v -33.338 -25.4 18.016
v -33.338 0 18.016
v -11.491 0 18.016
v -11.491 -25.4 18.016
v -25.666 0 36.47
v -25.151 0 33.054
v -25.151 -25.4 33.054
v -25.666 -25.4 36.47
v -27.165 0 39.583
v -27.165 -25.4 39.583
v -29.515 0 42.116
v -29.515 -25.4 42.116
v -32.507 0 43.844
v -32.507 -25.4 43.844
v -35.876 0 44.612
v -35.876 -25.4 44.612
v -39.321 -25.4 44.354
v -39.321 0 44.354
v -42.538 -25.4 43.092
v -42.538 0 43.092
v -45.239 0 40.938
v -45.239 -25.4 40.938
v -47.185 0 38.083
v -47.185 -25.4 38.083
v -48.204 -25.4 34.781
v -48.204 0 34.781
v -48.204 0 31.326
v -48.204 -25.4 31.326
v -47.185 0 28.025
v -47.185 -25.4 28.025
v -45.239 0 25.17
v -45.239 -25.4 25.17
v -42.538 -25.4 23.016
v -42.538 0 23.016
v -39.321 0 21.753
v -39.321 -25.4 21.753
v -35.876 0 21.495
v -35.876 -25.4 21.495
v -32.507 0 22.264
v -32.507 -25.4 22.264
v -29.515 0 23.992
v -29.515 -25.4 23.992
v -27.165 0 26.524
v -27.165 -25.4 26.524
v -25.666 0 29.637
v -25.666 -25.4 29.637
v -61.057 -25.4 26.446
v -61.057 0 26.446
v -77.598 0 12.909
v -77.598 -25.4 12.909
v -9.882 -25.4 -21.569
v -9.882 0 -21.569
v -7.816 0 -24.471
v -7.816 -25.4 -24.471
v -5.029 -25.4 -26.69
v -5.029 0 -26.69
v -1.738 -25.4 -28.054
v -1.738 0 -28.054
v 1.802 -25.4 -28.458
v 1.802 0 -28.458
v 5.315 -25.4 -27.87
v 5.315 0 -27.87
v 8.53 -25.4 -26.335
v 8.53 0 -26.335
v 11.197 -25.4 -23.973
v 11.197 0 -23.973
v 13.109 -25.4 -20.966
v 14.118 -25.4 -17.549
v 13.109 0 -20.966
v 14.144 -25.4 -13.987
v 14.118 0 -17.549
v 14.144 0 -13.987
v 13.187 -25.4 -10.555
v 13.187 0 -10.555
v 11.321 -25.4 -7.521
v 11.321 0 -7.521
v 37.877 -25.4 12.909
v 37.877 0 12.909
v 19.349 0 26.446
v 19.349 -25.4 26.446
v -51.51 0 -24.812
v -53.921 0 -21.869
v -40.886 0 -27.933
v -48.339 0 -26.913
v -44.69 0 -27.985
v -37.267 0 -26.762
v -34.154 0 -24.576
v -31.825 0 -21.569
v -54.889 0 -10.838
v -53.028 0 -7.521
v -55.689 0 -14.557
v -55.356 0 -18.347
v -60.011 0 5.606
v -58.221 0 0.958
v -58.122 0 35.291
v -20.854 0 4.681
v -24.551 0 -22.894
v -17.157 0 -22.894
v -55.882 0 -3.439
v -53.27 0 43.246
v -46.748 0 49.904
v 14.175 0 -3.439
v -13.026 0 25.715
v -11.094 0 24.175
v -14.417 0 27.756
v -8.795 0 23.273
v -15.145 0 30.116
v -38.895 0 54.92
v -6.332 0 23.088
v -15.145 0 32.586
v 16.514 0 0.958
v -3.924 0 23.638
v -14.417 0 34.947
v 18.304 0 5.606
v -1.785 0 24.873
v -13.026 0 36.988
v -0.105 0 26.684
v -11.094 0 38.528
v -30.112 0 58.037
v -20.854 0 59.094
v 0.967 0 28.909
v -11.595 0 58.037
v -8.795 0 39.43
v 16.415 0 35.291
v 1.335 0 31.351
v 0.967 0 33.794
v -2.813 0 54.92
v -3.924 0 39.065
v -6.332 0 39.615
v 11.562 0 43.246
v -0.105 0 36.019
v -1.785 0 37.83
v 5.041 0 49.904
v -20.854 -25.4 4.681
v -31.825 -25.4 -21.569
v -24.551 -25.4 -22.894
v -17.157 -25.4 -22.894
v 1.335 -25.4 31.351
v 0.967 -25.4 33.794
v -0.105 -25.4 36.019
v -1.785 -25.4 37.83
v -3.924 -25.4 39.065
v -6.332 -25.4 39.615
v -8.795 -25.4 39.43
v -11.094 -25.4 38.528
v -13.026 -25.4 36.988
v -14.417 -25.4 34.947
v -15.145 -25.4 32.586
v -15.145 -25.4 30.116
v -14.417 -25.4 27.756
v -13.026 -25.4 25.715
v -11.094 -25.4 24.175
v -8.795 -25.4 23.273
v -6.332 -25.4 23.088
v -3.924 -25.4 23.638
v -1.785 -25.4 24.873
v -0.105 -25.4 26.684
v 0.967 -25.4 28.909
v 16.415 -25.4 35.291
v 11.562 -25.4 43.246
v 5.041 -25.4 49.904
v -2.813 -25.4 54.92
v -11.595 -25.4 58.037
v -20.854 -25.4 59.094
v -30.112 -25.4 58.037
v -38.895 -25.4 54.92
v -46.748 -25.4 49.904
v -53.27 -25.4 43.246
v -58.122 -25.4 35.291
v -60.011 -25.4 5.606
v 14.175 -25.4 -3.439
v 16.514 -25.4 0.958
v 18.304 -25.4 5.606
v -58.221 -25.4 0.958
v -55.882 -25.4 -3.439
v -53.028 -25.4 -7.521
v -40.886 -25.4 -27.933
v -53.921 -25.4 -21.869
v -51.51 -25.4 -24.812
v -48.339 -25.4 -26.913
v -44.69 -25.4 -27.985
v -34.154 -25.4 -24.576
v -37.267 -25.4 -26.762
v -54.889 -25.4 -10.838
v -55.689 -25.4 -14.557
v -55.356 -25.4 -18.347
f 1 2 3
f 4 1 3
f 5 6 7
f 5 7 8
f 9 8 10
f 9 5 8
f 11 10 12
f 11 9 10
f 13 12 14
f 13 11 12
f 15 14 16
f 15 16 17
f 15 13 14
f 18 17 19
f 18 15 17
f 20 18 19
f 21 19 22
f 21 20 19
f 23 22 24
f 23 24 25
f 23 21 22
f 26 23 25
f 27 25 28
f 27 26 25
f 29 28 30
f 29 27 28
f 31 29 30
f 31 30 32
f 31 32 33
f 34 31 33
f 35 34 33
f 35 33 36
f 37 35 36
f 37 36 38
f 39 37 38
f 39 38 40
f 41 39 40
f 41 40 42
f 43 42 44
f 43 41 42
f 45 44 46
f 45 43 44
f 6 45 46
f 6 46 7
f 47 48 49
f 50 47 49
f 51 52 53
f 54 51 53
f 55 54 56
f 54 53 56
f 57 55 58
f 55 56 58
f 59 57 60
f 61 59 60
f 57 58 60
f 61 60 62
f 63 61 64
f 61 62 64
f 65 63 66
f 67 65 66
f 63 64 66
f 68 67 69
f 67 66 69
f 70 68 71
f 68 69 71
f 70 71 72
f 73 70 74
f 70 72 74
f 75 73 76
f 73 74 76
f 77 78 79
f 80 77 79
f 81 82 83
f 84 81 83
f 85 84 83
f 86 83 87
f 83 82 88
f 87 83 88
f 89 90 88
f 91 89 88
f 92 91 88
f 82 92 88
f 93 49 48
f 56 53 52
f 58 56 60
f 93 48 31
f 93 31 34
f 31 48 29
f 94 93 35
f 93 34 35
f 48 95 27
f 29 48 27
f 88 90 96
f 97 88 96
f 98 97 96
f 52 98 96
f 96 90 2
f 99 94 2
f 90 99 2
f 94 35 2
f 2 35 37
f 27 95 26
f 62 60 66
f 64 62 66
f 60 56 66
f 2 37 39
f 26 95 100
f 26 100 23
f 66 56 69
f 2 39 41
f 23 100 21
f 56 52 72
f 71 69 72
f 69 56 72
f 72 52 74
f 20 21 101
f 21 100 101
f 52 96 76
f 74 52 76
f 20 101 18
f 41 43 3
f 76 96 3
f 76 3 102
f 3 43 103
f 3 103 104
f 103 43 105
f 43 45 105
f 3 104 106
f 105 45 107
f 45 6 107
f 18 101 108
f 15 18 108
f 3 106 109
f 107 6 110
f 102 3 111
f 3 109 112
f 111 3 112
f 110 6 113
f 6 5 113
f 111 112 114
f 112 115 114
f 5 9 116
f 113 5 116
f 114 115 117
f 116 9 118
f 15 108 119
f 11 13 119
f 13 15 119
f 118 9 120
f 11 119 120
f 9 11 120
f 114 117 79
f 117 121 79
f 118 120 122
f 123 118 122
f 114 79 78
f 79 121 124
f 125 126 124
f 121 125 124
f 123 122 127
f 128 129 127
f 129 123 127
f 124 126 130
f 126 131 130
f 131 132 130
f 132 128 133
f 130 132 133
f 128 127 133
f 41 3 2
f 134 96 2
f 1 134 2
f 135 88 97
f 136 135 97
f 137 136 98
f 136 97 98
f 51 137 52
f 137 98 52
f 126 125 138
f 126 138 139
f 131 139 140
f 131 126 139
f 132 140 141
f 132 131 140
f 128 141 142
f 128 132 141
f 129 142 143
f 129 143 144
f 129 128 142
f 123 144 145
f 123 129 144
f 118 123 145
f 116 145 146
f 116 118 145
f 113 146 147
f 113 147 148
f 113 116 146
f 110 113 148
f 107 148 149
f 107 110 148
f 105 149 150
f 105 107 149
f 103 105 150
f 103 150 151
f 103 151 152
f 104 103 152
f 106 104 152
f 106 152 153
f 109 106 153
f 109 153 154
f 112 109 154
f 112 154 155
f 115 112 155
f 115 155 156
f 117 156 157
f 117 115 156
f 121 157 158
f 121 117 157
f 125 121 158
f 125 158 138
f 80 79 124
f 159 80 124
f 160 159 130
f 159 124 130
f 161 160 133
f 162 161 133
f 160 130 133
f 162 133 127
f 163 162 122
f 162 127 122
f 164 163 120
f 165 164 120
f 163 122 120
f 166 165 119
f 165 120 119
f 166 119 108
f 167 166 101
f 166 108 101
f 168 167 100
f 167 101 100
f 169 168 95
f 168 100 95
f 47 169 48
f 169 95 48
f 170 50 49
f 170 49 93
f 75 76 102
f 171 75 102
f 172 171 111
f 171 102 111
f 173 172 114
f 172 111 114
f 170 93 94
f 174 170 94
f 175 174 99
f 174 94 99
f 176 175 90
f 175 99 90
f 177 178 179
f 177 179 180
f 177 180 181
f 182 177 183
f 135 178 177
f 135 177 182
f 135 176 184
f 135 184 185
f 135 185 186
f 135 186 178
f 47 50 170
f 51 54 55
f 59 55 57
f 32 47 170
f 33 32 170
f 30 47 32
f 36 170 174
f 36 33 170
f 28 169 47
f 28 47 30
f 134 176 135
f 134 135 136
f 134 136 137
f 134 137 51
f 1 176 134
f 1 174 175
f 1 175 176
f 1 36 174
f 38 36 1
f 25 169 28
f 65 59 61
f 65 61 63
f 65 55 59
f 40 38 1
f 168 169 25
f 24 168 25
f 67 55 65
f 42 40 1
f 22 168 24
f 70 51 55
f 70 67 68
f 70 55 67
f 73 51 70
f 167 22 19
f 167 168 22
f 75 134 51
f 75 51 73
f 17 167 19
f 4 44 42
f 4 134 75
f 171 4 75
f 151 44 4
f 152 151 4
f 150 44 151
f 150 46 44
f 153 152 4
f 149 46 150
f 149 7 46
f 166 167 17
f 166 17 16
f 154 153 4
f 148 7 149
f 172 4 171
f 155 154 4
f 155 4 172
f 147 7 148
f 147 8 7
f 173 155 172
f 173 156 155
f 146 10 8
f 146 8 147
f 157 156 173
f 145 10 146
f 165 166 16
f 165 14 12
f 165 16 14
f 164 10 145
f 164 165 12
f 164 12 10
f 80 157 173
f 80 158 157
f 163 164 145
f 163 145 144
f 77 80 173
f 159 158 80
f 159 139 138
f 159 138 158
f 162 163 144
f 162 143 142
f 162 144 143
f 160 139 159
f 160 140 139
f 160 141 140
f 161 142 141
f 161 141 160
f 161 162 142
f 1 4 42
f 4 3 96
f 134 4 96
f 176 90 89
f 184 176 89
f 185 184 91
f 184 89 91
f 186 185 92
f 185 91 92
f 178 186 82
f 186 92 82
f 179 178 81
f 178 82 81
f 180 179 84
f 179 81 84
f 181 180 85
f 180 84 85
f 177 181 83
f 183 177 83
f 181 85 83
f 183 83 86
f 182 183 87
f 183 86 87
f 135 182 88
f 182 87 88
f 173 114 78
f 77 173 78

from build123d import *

# Parameters (mm, degrees)
F0_R     = 11.591064
F0_R_2   = 8.286471
F1_DEPTH = 25.4


with BuildPart() as f1:
    # F0 (on Front) → F1 (new body)
    with BuildSketch(Plane.XZ):
        with BuildLine():
            ThreePointArc((18.303812, 5.605529), (19.740788, 11.737184), (20.223563, 18.016437))
            ThreePointArc((20.223563, 18.016437), (20.00443, 22.253734), (19.349371, 26.445823))
            ThreePointArc((19.349371, 26.445823), (-20.85367, 59.09367), (-61.056712, 26.445823))
            ThreePointArc((-61.056712, 26.445823), (-61.879304, 15.958178), (-60.011153, 5.605529))
            ThreePointArc((-60.011153, 5.605529), (-57.118422, -1.276225), (-53.028005, -7.520816))
            ThreePointArc((-53.028005, -7.520816), (-43.541093, -16.227101), (-31.824876, -21.568556))
            ThreePointArc((-31.824876, -21.568556), (-20.85367, -23.060796), (-9.882464, -21.568556))
            ThreePointArc((-9.882464, -21.568556), (1.833753, -16.227101), (11.320664, -7.520816))
            ThreePointArc((11.320664, -7.520816), (15.411082, -1.276225), (18.303812, 5.605529))
        make_face()
        Polygon((-33.3375, 18.016437), (-20.85367, 18.016437), (-11.490798, 18.016437), (-20.85367, 4.681436), align=None, mode=Mode.SUBTRACT)
        with Locations((-36.742181, 33.053778)):
            Circle(F0_R, mode=Mode.SUBTRACT)
        with Locations((-6.951223, 31.351436)):
            Circle(F0_R_2, mode=Mode.SUBTRACT)
        with BuildLine():
            ThreePointArc((19.349371, 26.445823), (20.00443, 22.253734), (20.223563, 18.016437))
            ThreePointArc((20.223563, 18.016437), (19.740788, 11.737184), (18.303812, 5.605529))
            Line((18.303812, 5.605529), (37.877075, 12.909415))
            Line((37.877075, 12.909415), (19.349371, 26.445823))
        make_face()
        with BuildLine():
            ThreePointArc((-60.011153, 5.605529), (-61.879304, 15.958178), (-61.056712, 26.445823))
            Line((-61.056712, 26.445823), (-77.598356, 12.909415))
            Line((-77.598356, 12.909415), (-60.011153, 5.605529))
        make_face()
        with BuildLine():
            ThreePointArc((-9.882464, -21.568556), (8.530379, -26.334736), (11.320664, -7.520816))
            ThreePointArc((11.320664, -7.520816), (1.833753, -16.227101), (-9.882464, -21.568556))
        make_face()
        with BuildLine():
            ThreePointArc((-31.824876, -21.568556), (-43.541093, -16.227101), (-53.028005, -7.520816))
            ThreePointArc((-53.028005, -7.520816), (-50.003519, -25.981242), (-31.824876, -21.568556))
        make_face()
    extrude(amount=F1_DEPTH)


solid = f1.part
